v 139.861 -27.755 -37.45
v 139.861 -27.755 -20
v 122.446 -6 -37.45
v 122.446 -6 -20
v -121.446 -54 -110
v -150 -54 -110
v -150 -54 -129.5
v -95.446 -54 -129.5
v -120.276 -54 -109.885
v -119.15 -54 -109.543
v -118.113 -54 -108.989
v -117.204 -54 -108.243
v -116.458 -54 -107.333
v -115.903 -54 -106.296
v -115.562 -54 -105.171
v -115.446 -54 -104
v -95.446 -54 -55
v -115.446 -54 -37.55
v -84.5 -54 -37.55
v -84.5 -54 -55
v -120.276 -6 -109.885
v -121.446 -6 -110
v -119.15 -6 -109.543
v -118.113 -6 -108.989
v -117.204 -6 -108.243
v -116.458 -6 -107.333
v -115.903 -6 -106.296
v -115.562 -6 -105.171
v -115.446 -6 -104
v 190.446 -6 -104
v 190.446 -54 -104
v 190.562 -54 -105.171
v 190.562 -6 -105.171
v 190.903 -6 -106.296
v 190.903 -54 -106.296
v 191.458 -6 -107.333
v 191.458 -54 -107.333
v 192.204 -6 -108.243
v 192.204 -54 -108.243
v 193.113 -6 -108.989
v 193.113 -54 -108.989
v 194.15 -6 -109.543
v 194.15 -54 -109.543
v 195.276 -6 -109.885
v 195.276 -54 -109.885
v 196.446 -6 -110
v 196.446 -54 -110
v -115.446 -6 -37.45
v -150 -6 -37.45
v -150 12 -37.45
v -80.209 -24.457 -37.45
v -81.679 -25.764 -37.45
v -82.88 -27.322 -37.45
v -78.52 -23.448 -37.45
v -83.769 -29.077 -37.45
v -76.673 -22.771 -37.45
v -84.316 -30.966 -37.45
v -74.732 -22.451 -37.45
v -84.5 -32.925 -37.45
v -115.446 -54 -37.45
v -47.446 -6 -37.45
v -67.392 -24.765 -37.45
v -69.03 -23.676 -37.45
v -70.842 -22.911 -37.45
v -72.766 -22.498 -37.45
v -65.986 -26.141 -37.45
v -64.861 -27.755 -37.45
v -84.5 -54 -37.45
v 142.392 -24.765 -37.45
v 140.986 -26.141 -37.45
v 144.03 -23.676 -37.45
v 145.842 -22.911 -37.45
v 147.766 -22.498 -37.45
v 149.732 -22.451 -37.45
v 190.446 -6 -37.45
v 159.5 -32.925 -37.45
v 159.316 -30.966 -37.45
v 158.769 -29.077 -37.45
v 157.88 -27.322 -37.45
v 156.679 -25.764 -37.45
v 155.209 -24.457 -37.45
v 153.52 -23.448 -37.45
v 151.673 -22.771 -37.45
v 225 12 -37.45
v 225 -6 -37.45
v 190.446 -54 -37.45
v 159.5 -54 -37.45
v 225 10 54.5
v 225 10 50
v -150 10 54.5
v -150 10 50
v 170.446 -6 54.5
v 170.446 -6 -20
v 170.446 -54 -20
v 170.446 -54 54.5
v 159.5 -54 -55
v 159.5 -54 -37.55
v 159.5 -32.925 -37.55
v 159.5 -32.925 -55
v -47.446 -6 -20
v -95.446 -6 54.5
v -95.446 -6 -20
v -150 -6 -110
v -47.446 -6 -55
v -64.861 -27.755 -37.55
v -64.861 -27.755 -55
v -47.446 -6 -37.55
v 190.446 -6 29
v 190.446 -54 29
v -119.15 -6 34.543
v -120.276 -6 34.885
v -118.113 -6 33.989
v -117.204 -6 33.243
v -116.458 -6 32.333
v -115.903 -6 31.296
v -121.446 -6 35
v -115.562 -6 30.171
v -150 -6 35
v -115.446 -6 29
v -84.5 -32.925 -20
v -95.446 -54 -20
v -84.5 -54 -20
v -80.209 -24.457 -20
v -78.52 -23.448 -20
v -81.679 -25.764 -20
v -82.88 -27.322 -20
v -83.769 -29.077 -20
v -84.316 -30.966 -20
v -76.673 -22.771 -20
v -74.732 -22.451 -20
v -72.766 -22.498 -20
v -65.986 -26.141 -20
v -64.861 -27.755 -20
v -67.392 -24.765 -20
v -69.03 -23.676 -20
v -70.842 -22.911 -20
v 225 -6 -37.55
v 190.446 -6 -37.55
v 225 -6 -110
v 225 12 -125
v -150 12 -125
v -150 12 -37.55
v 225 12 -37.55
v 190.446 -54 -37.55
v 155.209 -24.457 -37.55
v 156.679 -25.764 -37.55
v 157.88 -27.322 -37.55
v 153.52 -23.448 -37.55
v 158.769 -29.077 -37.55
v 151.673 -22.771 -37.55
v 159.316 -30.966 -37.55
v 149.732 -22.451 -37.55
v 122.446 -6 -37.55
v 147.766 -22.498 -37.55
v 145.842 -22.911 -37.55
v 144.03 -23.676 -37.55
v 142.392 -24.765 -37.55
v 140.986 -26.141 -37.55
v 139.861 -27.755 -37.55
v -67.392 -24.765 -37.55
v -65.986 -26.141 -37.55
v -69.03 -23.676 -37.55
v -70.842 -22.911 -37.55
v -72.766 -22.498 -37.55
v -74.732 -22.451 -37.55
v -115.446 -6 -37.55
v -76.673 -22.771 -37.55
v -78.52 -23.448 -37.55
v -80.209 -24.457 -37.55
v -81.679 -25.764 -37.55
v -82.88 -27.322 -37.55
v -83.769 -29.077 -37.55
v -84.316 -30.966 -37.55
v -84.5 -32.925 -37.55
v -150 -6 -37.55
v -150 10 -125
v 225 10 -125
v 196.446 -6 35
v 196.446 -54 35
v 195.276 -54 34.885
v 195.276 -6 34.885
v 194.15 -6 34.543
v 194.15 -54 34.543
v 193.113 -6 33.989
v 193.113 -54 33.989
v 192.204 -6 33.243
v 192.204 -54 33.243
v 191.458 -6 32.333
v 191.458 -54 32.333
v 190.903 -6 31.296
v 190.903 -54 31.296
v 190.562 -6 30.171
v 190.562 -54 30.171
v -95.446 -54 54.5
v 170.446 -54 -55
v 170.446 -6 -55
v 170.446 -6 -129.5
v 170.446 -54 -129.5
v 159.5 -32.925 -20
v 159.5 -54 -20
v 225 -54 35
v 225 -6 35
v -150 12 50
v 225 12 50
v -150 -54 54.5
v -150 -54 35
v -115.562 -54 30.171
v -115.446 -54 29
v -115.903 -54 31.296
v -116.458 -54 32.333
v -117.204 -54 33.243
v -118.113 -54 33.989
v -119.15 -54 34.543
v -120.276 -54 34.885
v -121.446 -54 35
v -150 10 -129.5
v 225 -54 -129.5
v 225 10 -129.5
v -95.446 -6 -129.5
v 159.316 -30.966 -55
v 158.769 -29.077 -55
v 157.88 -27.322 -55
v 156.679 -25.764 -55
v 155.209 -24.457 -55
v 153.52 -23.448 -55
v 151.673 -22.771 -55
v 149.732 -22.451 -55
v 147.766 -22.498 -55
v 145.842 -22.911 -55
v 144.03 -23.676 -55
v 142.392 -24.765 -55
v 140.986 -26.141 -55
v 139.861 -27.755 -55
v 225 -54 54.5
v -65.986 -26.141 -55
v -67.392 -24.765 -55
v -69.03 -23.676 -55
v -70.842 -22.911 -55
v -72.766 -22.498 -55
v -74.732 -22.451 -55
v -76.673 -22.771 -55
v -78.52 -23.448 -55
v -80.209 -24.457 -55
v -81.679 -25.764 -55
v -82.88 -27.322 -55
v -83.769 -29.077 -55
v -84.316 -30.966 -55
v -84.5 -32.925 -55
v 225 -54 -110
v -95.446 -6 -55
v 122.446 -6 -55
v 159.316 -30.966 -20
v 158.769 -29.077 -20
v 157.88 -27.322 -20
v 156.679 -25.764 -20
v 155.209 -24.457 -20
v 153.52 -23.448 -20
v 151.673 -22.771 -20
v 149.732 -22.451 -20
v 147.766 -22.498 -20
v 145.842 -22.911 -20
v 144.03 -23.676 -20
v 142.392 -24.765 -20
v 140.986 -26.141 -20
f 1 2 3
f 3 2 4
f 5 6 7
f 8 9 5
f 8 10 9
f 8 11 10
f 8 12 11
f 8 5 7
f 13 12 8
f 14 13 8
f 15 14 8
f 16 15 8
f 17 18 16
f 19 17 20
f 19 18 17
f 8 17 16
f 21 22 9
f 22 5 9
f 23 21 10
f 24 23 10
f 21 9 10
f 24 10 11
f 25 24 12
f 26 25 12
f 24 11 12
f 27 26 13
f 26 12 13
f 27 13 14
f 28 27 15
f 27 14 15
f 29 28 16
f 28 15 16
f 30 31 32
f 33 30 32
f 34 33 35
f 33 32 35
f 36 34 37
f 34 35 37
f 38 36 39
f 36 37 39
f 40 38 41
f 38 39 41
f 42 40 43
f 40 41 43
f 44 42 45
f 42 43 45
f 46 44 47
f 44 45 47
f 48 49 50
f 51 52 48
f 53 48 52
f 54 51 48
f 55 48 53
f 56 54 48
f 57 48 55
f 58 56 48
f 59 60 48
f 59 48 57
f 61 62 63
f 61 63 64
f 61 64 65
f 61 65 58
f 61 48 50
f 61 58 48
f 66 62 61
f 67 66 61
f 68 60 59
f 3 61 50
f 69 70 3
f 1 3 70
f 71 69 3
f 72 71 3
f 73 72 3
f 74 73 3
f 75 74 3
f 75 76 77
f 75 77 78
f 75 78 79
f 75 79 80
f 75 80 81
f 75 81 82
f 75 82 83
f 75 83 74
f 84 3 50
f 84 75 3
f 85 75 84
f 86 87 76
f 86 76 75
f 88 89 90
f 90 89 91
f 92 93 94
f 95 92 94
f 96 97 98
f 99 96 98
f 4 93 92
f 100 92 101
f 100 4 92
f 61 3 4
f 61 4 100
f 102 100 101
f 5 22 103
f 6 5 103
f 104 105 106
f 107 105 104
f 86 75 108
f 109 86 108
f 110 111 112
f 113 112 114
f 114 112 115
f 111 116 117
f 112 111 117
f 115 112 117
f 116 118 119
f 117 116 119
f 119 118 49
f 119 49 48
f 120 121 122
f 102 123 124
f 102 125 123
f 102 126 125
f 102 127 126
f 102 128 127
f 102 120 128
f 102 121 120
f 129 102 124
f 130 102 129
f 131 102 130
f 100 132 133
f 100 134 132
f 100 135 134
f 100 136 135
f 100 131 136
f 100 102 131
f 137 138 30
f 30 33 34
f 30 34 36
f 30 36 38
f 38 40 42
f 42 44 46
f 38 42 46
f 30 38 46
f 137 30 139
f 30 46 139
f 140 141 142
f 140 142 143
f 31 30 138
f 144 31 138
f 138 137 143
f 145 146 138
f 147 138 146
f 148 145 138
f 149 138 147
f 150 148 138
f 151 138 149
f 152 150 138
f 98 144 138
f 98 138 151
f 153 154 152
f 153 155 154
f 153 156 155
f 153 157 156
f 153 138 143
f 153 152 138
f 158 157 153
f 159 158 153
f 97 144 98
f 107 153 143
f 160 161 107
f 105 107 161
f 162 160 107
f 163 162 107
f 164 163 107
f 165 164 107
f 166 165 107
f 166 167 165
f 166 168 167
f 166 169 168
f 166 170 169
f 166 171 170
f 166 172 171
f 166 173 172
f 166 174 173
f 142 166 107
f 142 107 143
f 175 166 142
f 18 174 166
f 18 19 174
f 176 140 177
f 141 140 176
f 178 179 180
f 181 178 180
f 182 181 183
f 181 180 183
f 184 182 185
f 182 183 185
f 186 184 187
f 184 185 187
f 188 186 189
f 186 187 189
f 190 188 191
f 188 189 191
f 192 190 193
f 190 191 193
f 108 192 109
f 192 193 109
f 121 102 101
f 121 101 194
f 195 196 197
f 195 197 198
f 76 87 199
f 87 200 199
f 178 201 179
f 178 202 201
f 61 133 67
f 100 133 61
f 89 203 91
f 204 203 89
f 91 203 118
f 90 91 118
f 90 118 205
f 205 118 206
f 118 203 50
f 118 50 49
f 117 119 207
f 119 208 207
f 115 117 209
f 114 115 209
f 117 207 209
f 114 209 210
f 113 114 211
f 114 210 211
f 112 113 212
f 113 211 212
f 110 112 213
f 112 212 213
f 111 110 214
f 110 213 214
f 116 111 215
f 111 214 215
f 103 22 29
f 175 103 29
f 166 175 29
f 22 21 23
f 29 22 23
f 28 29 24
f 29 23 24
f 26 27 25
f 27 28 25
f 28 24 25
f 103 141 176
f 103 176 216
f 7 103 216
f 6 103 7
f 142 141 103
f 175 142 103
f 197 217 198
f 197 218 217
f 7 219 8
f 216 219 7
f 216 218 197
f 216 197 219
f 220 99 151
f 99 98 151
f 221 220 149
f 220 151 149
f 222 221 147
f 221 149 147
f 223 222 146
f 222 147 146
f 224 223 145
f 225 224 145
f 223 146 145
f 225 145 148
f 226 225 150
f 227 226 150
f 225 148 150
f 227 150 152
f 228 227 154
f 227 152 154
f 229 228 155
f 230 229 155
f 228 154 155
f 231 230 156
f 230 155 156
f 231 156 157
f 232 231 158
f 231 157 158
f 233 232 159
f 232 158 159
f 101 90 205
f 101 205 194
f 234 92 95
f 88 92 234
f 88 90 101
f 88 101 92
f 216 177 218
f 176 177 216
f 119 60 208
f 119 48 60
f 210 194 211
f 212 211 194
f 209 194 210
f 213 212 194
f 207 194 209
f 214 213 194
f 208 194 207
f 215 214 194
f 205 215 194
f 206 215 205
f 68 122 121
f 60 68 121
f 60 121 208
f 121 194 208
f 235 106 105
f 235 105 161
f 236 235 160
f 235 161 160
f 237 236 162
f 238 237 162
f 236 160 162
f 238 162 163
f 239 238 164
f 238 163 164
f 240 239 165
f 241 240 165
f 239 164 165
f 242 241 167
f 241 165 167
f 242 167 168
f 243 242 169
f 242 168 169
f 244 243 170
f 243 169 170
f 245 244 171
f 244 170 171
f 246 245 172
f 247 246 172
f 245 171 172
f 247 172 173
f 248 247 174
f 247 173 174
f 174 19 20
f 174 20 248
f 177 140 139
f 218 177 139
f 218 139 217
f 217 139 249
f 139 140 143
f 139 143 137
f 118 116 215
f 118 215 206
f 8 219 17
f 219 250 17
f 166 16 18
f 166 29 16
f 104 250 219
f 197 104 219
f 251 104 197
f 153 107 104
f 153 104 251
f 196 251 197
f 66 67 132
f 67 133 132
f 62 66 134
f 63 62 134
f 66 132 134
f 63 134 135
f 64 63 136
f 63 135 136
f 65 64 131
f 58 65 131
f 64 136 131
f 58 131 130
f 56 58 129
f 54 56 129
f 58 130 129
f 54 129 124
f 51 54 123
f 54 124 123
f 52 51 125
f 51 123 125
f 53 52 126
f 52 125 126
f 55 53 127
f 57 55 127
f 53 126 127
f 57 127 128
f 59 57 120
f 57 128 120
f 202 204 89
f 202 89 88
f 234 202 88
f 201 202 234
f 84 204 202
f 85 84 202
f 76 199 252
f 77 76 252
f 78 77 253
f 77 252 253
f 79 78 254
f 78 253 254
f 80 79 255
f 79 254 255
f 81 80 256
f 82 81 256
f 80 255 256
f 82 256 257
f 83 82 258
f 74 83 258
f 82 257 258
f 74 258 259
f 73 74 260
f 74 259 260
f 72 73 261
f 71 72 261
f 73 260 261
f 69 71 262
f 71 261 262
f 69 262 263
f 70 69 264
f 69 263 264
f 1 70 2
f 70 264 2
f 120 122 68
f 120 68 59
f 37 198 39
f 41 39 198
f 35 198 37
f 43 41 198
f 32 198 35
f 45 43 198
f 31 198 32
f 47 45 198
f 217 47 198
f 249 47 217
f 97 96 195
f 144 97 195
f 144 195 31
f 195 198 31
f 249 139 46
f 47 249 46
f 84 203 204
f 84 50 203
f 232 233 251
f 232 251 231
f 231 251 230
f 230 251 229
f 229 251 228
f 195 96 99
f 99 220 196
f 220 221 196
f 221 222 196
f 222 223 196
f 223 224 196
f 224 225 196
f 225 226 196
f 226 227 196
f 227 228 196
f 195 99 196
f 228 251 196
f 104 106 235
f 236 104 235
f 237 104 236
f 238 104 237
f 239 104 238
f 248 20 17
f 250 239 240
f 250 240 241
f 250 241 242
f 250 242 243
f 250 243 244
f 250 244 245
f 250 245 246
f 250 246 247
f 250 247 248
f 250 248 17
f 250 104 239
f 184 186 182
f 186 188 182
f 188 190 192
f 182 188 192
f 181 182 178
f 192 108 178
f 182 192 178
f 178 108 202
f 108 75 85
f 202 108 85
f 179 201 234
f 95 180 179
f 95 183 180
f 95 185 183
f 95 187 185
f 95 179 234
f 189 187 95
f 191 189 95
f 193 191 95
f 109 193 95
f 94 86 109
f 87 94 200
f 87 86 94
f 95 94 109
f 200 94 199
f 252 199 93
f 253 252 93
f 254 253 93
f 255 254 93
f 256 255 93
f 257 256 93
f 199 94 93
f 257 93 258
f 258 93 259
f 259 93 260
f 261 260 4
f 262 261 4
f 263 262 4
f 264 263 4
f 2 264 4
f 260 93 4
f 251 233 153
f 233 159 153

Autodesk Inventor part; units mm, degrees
ref_plane "YZ Plane" through (0, 0, 0) normal (1, 0, 0) x (0, 1, 0)
ref_plane "XZ Plane" through (0, 0, 0) normal (0, 1, 0) x (-1, 0, 0)
ref_plane "XY Plane" through (0, 0, 0) normal (0, 0, 1) x (1, 0, 0)
sketch "Sketch1" plane through (0, 0, 0) normal (0, 1, 0) x (-1, 0, 0)
  line L0 (50, 50) -> (-125, 50)
  line L1 (-125, 50) -> (-125, -125)
  line L2 (-125, -125) -> (50, -125)
  line L3 (50, -125) -> (50, 50)
  point P0 (0, 0)
  dimension "d0" = 175
  dimension "d1" = 175
extrude "Extrusion1" add sketch "Sketch1" along normal blind 12
sketch "Sketch2" plane through (0, 12, 0) normal (0, 1, 0) x (1, 0, 0)
  line L0 (-50, -50) -> (125, -50) projected
  line L1 (-150, -50) -> (225, -50)
  line L2 (225, -50) -> (225, 125)
  line L3 (225, 125) -> (-150, 125)
  line L4 (-150, 125) -> (-150, -50)
  line L5 (-50, 125) -> (-50, -50) projected
  line L6 (125, -50) -> (125, 125) projected
  point P0 (0, 0)
  point P1 (55, -50)
  dimension "d8" = 100
  dimension "d9" = 100
extrude "Extrusion2" add sketch "Sketch2" against normal blind 18
sketch "Sketch3" plane through (0, 0, 0) normal (0, -1, 0) x (1, 0, 0)
  line L0 (225, 50) -> (-150, 50) projected
  line L1 (-150, 50) -> (-150, -125) projected
  line L2 (-150, -125) -> (225, -125) projected
  line L3 (225, -125) -> (225, 50) projected
  line L4 (-115.4465, 50) -> (-95.4465, 50)
  line L5 (-95.4465, 50) -> (-95.4465, -125)
  line L6 (-95.4465, -125) -> (-115.4465, -125)
  line L7 (-115.4465, -125) -> (-115.4465, 50)
  line L8 (190.4465, 50) -> (170.4465, 50)
  line L9 (170.4465, 50) -> (170.4465, -125)
  line L10 (170.4465, -125) -> (190.4465, -125)
  line L11 (190.4465, -125) -> (190.4465, 50)
  line L12 (-150, -125) -> (-115.4465, -125)
  line L13 (-115.4465, -125) -> (-115.4465, -110)
  line L14 (-115.4465, -110) -> (-150, -110)
  line L15 (-150, -110) -> (-150, -125)
  line L16 (-150, 50) -> (-115.4465, 50)
  line L17 (-115.4465, 50) -> (-115.4465, 35)
  line L18 (-115.4465, 35) -> (-150, 35)
  line L19 (-150, 35) -> (-150, 50)
  line L20 (190.4465, 50) -> (225, 50)
  line L21 (225, 50) -> (225, 35)
  line L22 (225, 35) -> (190.4465, 35)
  line L23 (190.4465, 35) -> (190.4465, 50)
  line L24 (190.4465, -125) -> (225, -125)
  line L25 (225, -125) -> (225, -110)
  line L26 (225, -110) -> (190.4465, -110)
  line L27 (190.4465, -110) -> (190.4465, -125)
  line L28 (-95.4465, -20) -> (-45.4465, -20)
  line L29 (-45.4465, -20) -> (-45.4465, -55)
  line L30 (-45.4465, -55) -> (-95.4465, -55)
  line L31 (-95.4465, -55) -> (-95.4465, -20)
  line L32 (170.4465, -20) -> (120.4465, -20)
  line L33 (120.4465, -20) -> (120.4465, -55)
  line L34 (120.4465, -55) -> (170.4465, -55)
  line L35 (170.4465, -55) -> (170.4465, -20)
  point P0 (0, 0)
  point P1 (190.4465, -125)
  point P2 (170.4465, 50)
  dimension "d10" = 265.893
  dimension "d11" = 20
  dimension "d12" = 20
  dimension "d13" = 34.5535
  dimension "d14" = 34.5535
  dimension "d17" = 15
  dimension "d18" = 15
  dimension "d19" = 15
  dimension "d20" = 15
  dimension "d22" = 50
  dimension "d23" = 50
  dimension "d24" = 70
  dimension "d25" = 70
extrude "Extrusion3" add sketch "Sketch3" along normal blind 48 contours L3 L22 L11 L0 | L11 L2 L9 L0 | L3 L2 L11 L26 | L5 L2 L7 L0 | L9 L34 L33 L32 | L7 L18 L1 L0 | L28 L29 L30 L5 | L7 L2 L1 L14
fillet "Fillet1" radius 6 4 edges at (-115.4465, -27, -110) (-115.4465, -27, 35) (190.4465, -27, 35) (190.4465, -27, -110)
sketch "Sketch4" plane through (0, -48, 0) normal (0, -1, 0) x (1, 0, 0)
  point P0 (0, 0)
sketch "Sketch5" plane through (120.4465, -6, -20) normal (0, 0, 1) x (1, 0, 0)
  circle A0 centre (28.5535, -26.925) radius 10.5
  circle A1 centre (-194.4465, -26.925) radius 10.5
  line L0 (-215.893, 0) -> (-215.893, -42) projected
  line L1 (50, 0) -> (50, -42) projected
  line L2 (50, 0) -> (-215.893, 0) projected
  line L3 (2, 0) -> (0, 0)
  line L4 (0, 0) -> (0, -42) projected
  line L5 (0, -42) -> (12, -42)
  line L6 (12, -42) -> (28.5535, -26.925)
  line L7 (-165.893, 0) -> (-165.893, -42) projected
  line L8 (-167.893, 0) -> (-165.893, 0)
  line L9 (-165.893, -42) -> (-215.893, -42) projected
  line L10 (-165.893, 0) -> (-165.893, -42)
  line L11 (-165.893, -42) -> (-194.4465, -42)
  line L12 (-194.4465, -42) -> (-194.4465, -26.925)
  line L13 (-204.9465, -26.925) -> (-194.4465, -26.925)
  line L14 (-194.4465, -26.925) -> (-194.4465, -42)
  line L15 (-194.4465, -42) -> (-204.9465, -42)
  line L16 (-204.9465, -42) -> (-204.9465, -26.925)
  line L17 (39.0535, -26.925) -> (12, -26.925)
  line L18 (12, -26.925) -> (12, -42)
  line L19 (12, -42) -> (39.0535, -42)
  line L20 (39.0535, -42) -> (39.0535, -26.925)
  line L21 (-194.4465, -26.925) -> (-189.4465, -26.925)
  line L22 (28.5535, -26.925) -> (23.5535, -26.925)
  line L23 (23.5535, -26.925) -> (2, 0)
  line L24 (-189.4465, -26.925) -> (-167.893, 0)
  point P0 (-120.4465, 6)
  point P1 (20.7903, -33.9948)
  point P2 (-194.4465, -37.425)
  point P3 (19.4147, -21.7547)
  point P4 (2, 0)
  point P5 (-185.3077, -21.7547)
  point P6 (-167.893, 0)
  dimension "d32" = 21
  dimension "d33" = 21
  dimension "d26" = 223
  dimension "d27" = 21.4465
  dimension "d29" = 26.925
  dimension "d30" = 26.925
  dimension "d31" = 21.4465
  dimension "d34" = 12
  dimension "d35" = 2
  dimension "d37" = 2
  dimension "d40" = 5
  dimension "d41" = 5
extrude "Extrusion4" cut sketch "Sketch5" against normal blind 54 contours L17 L23 A0 | L20 L19 L6 A0 | A0 L6 L17 | L7 L9 L12 A1 L24 L2 | L23 L17 A0 | A0 L17 L18 L5 L4 L2 L23 | L6 L18 L17 A0 | A0 L17 L6 | L24 L21 L13 A1 | A1 L12 L21 L24 | L9 L16 A1 L12 | L13 L12 A1
sketch "Sketch6" plane through (0, -48, 0) normal (0, -1, 0) x (1, 0, 0)
  line L0 (-168, -37.45) -> (251, -37.45)
  line L1 (251, -37.45) -> (251, -37.55)
  line L2 (251, -37.55) -> (-168, -37.55)
  line L3 (-168, -37.55) -> (-168, -37.45)
  line L4 (170.4465, 50) -> (-95.4465, 50) projected
  line L5 (-95.4465, -125) -> (170.4465, -125) projected
  point P0 (0, 0)
  dimension "d42" = 87.45
  dimension "d43" = 87.45
extrude "Extrusion5" cut sketch "Sketch6" against normal blind 98
sketch "Sketch7" plane through (0, -48, 0) normal (0, -1, 0) x (1, 0, 0)
  line L0 (-115.4465, -37.45) -> (-84.5, -37.45) projected
  line L1 (-84.5, -37.45) -> (-84.5, -20) projected
  line L2 (-84.5, -20) -> (-95.4465, -20) projected
  line L3 (-95.4465, -20) -> (-95.4465, 50) projected
  line L4 (-95.4465, 50) -> (-150, 50) projected
  line L5 (-150, 50) -> (-150, 35) projected
  line L6 (-150, 35) -> (-121.4465, 35) projected
  arc A0 (-115.4465, 29) -> (-121.4465, 35) centre (-121.4465, 29) ccw projected
  line L7 (-115.4465, 29) -> (-115.4465, -37.45) projected
  line L8 (-84.5, -37.55) -> (-115.4465, -37.55) projected
  line L9 (-115.4465, -37.55) -> (-115.4465, -104) projected
  arc A1 (-121.4465, -110) -> (-115.4465, -104) centre (-121.4465, -104) ccw projected
  line L10 (-121.4465, -110) -> (-150, -110) projected
  line L11 (-150, -110) -> (-150, -125) projected
  line L12 (-150, -125) -> (-95.4465, -125) projected
  line L13 (-95.4465, -125) -> (-95.4465, -55) projected
  line L14 (-95.4465, -55) -> (-84.5, -55) projected
  line L15 (-84.5, -55) -> (-84.5, -37.55) projected
  line L16 (159.5, -37.45) -> (190.4465, -37.45) projected
  line L17 (190.4465, -37.45) -> (190.4465, 29) projected
  arc A2 (196.4465, 35) -> (190.4465, 29) centre (196.4465, 29) ccw projected
  line L18 (196.4465, 35) -> (225, 35) projected
  line L19 (225, 35) -> (225, 50) projected
  line L20 (225, 50) -> (170.4465, 50) projected
  line L21 (170.4465, 50) -> (170.4465, -20) projected
  line L22 (170.4465, -20) -> (159.5, -20) projected
  line L23 (159.5, -20) -> (159.5, -37.45) projected
  line L24 (190.4465, -37.55) -> (159.5, -37.55) projected
  line L25 (159.5, -37.55) -> (159.5, -55) projected
  line L26 (159.5, -55) -> (170.4465, -55) projected
  line L27 (170.4465, -55) -> (170.4465, -125) projected
  line L28 (170.4465, -125) -> (225, -125) projected
  line L29 (225, -125) -> (225, -110) projected
  line L30 (225, -110) -> (196.4465, -110) projected
  arc A3 (190.4465, -104) -> (196.4465, -110) centre (196.4465, -104) ccw projected
  line L31 (190.4465, -104) -> (190.4465, -37.55) projected
  point P0 (0, 0)
extrude "Extrusion6" add sketch "Sketch7" along normal blind 6
sketch "Sketch8" plane through (-150, 12, 50) normal (0, 0, 1) x (1, 0, 0)
  line L0 (375, 0) -> (375, -66) projected
  line L1 (0, 0) -> (375, 0) projected
  line L2 (0, 0) -> (0, -66) projected
  line L3 (54.5535, -66) -> (0, -66) projected
  line L4 (54.5535, -18) -> (54.5535, -66) projected
  line L5 (320.4465, -18) -> (54.5535, -18) projected
  line L6 (320.4465, -18) -> (320.4465, -66) projected
  line L7 (375, -66) -> (320.4465, -66) projected
  line L8 (0, 0) -> (375, 0)
  line L9 (375, 0) -> (375, -2)
  line L10 (375, -2) -> (0, -2)
  line L11 (0, -2) -> (0, 0)
  point P0 (150, -12)
  point P1 (375, -2)
  point P2 (0, -2)
extrude "Extrusion7" add sketch "Sketch8" along normal blind 4.5 contours L0 L7 L6 L5 L4 L3 L2 L10
sketch "Sketch9" plane through (225, 12, -125) normal (0, 0, -1) x (-1, 0, 0)
  line L0 (320.4465, -18) -> (54.5535, -18) projected
  line L1 (320.4465, -18) -> (320.4465, -66) projected
  line L2 (375, -66) -> (320.4465, -66) projected
  line L3 (375, 0) -> (375, -66) projected
  line L4 (0, 0) -> (375, 0) projected
  line L5 (0, 0) -> (0, -66) projected
  line L6 (54.5535, -66) -> (0, -66) projected
  line L7 (54.5535, -18) -> (54.5535, -66) projected
  line L8 (375, 0) -> (0, 0)
  line L9 (0, 0) -> (0, -2)
  line L10 (0, -2) -> (375, -2)
  line L11 (375, -2) -> (375, 0)
  point P0 (225, -12)
  point P1 (375, -2)
extrude "Extrusion8" add sketch "Sketch9" along normal blind 4.5 contours L0 L7 L6 L5 L10 L3 L2 L1
properties part number "ZadBabkaOsnova" material "Aluminum 6061"
